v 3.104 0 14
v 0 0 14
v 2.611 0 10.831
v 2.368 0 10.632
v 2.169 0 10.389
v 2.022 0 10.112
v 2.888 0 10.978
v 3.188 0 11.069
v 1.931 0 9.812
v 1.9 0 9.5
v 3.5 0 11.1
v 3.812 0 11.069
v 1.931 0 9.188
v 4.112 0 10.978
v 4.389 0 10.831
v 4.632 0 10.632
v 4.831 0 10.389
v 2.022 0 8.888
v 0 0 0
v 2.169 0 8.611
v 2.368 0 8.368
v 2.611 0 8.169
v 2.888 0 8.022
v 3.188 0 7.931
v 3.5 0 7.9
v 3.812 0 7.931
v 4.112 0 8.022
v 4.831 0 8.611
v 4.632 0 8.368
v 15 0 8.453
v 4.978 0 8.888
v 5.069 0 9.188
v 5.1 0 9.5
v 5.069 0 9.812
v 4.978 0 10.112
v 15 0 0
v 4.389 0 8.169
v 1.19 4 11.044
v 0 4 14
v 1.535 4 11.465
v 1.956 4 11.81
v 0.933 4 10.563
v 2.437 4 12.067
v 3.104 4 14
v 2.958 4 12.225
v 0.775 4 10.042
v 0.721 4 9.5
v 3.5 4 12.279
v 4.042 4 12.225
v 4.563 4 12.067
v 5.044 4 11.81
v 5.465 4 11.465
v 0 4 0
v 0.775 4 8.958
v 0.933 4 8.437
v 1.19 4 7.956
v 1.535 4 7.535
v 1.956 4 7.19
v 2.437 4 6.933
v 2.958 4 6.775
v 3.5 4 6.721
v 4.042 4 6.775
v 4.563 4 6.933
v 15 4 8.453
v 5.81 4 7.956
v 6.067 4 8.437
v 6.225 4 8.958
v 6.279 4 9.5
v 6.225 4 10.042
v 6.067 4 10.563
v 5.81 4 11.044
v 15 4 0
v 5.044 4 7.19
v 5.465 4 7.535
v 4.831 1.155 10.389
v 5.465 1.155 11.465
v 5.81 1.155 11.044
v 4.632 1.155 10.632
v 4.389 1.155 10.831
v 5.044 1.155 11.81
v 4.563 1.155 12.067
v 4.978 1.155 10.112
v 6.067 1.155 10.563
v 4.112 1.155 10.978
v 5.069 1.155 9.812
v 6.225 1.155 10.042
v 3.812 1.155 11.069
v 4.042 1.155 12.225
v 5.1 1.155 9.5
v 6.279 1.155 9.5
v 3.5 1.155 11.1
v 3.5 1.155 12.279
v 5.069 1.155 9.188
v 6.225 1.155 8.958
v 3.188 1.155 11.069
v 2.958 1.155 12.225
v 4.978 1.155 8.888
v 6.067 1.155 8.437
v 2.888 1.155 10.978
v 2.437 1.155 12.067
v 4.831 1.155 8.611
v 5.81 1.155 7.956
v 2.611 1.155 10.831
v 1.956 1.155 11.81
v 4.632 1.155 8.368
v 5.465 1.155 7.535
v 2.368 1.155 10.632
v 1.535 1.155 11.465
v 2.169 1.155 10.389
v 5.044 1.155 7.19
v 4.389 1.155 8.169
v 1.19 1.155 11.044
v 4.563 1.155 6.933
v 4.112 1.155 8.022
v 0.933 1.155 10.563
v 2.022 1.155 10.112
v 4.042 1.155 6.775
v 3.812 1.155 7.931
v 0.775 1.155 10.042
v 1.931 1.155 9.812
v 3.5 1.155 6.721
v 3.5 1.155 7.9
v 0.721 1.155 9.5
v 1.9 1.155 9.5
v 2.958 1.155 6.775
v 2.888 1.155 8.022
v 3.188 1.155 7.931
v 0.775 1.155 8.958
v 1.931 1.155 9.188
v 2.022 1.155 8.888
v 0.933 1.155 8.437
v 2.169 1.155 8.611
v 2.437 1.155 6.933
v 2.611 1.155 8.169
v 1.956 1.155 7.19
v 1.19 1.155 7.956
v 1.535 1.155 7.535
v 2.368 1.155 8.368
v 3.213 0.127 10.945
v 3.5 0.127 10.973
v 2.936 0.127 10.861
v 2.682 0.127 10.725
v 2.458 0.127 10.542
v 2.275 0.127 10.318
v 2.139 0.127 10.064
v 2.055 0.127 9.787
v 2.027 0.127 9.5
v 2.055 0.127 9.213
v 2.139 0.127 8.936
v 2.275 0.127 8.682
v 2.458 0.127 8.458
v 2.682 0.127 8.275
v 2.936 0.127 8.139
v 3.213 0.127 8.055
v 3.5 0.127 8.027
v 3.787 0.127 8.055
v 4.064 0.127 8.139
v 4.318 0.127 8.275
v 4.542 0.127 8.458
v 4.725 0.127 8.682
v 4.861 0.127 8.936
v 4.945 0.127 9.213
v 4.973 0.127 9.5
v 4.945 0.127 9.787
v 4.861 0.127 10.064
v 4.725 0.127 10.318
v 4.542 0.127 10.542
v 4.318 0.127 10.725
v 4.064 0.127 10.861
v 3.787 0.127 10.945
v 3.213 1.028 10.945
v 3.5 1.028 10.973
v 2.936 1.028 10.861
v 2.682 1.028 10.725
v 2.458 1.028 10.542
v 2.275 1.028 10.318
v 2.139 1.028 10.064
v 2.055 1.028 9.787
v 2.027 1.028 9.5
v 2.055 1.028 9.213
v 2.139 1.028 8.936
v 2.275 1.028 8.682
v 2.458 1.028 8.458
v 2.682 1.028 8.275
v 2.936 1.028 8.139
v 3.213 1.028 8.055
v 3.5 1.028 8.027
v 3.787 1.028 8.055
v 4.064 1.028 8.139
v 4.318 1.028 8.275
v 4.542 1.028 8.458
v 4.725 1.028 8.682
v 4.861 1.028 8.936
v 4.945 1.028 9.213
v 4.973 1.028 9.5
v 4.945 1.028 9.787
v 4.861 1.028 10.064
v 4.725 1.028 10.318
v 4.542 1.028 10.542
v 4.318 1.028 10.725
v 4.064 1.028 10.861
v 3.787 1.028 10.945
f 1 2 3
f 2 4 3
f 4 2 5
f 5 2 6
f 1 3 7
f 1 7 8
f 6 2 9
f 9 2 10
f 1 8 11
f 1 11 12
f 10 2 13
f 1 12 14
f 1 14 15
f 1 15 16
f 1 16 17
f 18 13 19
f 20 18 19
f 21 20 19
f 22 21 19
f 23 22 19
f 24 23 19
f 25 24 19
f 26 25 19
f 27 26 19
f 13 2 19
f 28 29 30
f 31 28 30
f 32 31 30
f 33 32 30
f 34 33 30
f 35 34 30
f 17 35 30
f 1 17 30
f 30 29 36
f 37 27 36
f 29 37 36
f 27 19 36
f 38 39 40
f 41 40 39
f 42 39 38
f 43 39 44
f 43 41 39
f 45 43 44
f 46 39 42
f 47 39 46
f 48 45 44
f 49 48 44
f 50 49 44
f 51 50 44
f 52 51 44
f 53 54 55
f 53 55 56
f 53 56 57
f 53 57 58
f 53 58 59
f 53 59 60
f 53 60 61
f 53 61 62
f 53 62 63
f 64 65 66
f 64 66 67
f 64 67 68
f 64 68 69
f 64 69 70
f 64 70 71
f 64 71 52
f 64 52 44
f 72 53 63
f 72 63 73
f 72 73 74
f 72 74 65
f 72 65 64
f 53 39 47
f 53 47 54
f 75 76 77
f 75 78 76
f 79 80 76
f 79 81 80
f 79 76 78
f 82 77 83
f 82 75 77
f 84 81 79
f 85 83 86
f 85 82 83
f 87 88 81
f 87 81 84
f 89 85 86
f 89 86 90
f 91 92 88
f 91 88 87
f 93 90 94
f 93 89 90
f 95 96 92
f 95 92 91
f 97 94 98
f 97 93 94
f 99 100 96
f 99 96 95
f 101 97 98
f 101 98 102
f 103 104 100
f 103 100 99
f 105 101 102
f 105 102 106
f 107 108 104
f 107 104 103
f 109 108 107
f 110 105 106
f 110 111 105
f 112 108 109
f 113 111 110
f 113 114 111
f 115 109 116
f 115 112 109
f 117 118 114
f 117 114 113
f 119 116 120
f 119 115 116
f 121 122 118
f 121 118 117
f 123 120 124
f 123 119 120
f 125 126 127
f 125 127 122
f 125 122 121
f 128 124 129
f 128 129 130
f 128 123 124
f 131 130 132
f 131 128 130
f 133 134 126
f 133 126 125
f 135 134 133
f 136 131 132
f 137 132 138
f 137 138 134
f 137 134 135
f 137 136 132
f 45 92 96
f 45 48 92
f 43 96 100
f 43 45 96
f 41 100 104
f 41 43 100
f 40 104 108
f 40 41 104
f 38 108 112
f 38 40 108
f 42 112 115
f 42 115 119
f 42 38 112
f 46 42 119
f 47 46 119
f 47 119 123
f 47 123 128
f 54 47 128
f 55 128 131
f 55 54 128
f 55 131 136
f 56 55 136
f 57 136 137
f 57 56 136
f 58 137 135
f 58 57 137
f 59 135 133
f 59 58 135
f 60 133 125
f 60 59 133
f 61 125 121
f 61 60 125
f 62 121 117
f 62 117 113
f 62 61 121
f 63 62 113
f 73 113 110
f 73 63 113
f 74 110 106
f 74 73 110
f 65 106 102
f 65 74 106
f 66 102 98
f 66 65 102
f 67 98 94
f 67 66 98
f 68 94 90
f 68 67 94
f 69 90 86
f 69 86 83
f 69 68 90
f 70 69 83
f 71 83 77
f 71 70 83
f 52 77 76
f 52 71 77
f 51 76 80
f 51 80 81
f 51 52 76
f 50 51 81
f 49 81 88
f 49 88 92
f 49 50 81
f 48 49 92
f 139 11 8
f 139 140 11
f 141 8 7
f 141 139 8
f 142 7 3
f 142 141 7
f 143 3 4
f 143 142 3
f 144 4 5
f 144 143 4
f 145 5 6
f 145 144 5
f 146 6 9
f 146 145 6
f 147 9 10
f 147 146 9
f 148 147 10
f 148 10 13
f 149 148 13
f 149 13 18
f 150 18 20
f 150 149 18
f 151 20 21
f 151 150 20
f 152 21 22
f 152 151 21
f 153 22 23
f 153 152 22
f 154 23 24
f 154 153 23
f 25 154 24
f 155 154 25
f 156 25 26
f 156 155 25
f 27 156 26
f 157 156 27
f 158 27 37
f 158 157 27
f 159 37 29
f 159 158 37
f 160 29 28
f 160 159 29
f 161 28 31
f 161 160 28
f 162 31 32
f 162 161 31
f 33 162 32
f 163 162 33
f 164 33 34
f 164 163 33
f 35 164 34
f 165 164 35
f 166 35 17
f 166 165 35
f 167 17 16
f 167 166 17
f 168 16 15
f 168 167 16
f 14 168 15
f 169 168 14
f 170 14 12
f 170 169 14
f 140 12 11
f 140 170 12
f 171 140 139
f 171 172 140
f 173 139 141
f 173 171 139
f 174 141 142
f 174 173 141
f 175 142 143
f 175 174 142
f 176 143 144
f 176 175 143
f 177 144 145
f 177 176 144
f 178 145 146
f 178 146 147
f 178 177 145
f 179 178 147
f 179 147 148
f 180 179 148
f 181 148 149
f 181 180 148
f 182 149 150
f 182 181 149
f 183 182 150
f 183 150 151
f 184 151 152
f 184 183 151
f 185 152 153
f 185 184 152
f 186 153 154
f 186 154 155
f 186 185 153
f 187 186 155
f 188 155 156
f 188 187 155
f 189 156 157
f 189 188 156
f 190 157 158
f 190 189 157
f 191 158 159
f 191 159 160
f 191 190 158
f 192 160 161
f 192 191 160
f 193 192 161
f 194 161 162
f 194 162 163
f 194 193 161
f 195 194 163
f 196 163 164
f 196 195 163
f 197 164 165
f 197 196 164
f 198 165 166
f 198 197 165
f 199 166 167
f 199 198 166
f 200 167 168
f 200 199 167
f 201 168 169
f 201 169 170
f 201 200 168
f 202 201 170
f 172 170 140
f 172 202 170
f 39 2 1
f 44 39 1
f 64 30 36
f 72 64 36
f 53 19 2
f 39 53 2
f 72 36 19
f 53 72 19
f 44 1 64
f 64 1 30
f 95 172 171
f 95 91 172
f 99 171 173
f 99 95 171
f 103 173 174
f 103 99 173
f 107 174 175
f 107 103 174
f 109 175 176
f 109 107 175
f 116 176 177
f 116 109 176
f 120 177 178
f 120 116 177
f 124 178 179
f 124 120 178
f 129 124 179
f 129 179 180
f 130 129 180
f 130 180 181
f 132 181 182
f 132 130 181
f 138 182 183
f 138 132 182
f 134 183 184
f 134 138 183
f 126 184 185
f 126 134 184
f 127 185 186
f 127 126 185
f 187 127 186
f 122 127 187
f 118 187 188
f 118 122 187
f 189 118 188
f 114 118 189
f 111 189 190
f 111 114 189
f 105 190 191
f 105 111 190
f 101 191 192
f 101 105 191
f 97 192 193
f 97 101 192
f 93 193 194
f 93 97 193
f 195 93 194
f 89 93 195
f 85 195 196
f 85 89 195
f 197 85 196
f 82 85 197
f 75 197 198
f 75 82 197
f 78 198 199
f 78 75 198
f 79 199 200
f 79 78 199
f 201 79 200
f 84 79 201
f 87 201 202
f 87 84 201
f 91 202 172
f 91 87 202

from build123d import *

# Parameters (mm, degrees)
EXTRUDE_1_DEPTH = 4


with BuildPart() as part:
    # Эскиз1 → Бобышка-Вытянуть1 (new body)
    with BuildSketch(Plane(origin=(0, 0, 0), x_dir=(1, 0, 0), z_dir=(0, 1, 0))):
        Polygon((0, 0), (0, -14), (3.103725277, -14), (15, -8.452675993), (15, 0), align=None)
    extrude(amount=EXTRUDE_1_DEPTH)

    # Эскиз2 → Цековка для  винта с внутренним шестигранником #41 (revolve, cut)
    with BuildSketch(Plane(origin=(3.5, 4, 9.5), x_dir=(0, 0, 1), z_dir=(1, 0, 0))):
        Polygon((0, 0), (0, 4), (1.6002, 4), (1.4732, 3.873), (1.4732, 2.9718), (1.6002, 2.8448), (2.77876, 2.8448), (2.77876, 0), align=None)
    revolve(axis=Axis((3.5, 10.35, 9.5), (0, -1, 0)), mode=Mode.SUBTRACT)


solid = part.part
